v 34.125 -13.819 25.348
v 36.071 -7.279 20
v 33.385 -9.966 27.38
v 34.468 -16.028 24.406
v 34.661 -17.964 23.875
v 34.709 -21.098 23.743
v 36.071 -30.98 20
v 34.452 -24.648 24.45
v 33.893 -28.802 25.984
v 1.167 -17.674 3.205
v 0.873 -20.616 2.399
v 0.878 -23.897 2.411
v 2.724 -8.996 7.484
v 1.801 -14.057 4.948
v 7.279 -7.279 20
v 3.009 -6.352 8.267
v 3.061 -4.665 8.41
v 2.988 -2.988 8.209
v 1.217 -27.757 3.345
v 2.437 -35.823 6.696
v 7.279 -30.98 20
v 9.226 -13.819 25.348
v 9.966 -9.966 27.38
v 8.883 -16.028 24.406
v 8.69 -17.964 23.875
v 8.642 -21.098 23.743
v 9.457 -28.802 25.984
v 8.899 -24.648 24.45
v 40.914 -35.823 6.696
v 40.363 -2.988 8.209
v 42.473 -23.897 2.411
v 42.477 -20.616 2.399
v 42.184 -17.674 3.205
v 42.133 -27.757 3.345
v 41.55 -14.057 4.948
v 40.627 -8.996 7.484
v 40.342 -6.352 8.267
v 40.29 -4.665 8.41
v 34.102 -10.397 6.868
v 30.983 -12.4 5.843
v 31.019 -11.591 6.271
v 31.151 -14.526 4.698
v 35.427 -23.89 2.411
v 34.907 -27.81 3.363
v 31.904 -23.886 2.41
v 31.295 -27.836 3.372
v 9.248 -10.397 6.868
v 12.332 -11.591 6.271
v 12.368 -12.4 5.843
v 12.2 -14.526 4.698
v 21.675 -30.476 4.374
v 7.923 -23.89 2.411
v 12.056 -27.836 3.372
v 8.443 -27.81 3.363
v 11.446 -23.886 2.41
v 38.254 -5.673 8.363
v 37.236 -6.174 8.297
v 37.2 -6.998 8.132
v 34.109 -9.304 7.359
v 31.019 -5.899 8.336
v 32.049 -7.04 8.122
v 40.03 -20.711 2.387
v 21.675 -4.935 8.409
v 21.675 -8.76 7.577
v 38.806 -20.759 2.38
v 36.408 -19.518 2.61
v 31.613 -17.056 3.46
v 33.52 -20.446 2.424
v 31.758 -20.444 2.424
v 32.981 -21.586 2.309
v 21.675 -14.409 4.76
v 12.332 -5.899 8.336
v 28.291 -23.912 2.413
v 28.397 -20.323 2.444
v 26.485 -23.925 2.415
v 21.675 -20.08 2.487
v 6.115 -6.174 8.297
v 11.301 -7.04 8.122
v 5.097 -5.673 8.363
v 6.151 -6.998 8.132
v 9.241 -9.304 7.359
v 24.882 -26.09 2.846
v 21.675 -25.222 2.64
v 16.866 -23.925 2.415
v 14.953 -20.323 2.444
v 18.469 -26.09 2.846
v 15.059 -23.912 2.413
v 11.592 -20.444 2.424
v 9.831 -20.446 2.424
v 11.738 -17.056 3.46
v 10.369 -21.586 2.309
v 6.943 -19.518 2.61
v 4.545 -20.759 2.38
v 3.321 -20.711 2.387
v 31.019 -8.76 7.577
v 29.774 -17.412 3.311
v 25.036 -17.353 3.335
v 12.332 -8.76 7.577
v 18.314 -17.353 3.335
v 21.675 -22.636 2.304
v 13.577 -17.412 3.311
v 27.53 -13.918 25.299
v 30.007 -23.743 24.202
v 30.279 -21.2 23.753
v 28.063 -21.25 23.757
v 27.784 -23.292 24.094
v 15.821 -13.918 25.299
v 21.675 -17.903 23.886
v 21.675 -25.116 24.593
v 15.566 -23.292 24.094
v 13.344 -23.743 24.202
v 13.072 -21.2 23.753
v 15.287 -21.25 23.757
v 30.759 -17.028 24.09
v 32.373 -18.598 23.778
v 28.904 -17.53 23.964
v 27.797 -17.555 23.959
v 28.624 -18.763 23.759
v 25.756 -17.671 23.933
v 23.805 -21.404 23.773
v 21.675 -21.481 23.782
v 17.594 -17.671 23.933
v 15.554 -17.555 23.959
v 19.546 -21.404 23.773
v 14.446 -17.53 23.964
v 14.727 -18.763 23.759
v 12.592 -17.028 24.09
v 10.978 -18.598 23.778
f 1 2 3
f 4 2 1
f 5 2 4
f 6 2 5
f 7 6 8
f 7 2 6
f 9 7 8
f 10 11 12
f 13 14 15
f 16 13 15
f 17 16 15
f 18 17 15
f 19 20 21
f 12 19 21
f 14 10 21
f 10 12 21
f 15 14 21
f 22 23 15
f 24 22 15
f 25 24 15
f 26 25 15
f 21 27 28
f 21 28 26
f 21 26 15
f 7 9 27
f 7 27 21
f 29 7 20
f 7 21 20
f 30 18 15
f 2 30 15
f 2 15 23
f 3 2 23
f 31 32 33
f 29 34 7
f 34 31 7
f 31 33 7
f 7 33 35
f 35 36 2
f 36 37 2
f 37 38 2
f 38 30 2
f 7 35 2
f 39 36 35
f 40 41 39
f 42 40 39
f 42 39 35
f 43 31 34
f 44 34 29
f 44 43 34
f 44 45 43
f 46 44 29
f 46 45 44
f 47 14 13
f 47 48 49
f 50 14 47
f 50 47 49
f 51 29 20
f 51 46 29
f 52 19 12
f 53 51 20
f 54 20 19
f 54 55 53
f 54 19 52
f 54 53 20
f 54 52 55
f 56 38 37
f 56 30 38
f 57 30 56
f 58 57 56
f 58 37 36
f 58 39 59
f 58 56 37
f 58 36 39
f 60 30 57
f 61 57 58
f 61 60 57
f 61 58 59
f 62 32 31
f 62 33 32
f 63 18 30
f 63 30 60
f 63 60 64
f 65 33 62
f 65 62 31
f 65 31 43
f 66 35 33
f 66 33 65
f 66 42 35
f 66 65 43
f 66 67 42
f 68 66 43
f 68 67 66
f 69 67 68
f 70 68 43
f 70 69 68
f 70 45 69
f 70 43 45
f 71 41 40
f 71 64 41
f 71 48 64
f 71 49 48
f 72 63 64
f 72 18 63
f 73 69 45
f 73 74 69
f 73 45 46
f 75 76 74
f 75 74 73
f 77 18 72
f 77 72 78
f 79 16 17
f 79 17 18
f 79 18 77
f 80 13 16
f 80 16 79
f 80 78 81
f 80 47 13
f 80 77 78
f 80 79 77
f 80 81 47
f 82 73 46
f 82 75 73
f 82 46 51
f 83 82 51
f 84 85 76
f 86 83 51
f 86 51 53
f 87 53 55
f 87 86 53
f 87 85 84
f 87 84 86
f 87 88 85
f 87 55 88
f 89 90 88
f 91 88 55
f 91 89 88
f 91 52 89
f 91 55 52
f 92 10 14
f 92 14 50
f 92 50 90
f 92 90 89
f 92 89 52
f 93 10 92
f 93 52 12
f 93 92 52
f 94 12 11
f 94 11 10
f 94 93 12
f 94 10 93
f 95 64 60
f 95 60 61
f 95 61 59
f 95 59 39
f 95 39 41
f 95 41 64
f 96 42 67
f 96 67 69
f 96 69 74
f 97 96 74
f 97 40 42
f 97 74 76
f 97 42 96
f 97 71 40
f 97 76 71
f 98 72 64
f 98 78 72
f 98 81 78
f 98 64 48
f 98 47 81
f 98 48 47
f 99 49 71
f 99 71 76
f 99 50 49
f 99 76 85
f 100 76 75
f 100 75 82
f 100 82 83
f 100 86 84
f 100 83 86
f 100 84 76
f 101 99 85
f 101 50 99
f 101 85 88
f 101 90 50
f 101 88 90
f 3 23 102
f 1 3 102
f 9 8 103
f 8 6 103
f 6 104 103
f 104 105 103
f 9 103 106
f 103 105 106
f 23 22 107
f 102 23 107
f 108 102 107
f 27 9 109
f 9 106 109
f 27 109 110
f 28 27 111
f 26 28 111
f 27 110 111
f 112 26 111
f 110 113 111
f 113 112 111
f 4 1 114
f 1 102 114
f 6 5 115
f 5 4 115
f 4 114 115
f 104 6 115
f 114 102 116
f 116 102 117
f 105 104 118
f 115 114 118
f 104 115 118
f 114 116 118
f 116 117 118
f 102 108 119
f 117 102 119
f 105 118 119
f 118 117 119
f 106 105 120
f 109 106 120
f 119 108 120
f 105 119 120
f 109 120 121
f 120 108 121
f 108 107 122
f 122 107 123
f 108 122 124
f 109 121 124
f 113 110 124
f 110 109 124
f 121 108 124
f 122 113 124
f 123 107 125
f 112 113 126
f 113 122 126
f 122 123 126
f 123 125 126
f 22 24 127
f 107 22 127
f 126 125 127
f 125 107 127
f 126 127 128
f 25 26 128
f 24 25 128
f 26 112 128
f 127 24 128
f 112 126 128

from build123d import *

# Parameters (mm, degrees)
F_1_FR_W        = 43.350723316
F_1_FR_H        = 38.259713105
EXTRUDE_1_DEPTH = 20
EXTRUDE_1_TAPER = 20
OTHER_START     = -1
OTHER_1_DEPTH   = 45
OTHER_START_2   = 7.279404685
OTHER_1_2_DEPTH = 28.791913946
OTHER_START_3   = -35.822740595
OTHER_1_3_DEPTH = 32.835074171


with BuildPart() as part:
    # Эскиз1_fr → Бобышка-Вытянуть1 (new body)
    with BuildSketch(Plane.XY):
        with Locations((21.675361658, -19.129856553)):
            Rectangle(F_1_FR_W, F_1_FR_H)
    extrude(amount=EXTRUDE_1_DEPTH, taper=EXTRUDE_1_TAPER)

    # Заменить грань1: read off the stored shape, not the designer's step
    # Заменить грань1 outline → Заменить грань1 (cut)
    with BuildSketch(Plane.YZ.offset(OTHER_START)):
        with BuildLine():
            Line((0, 0), (-2.987666524, 8.208546313))
            add(Edge.make_bspline(
                [(-2.987666524, 8.208546313), (-8.870550538, 9.578826995), (-19.207758762, -1.740918138), (-30.435430933, 4.410138177), (-35.822740495, 6.695527216)],
                knots=[0.134570032, 0.134570032, 0.134570032, 0.134570032, 0.484609084, 0.79490495, 0.79490495, 0.79490495, 0.79490495], degree=3))
            Line((-35.822740495, 6.695527216), (-38.259713105, 0))
            Line((-38.259713105, 0), (0, 0))
        make_face()
    extrude(amount=OTHER_1_DEPTH, mode=Mode.SUBTRACT)

    # Other 1 2 outline → Other 1 2 (add)
    with BuildSketch(Plane.YZ.offset(OTHER_START_2)):
        with BuildLine():
            Line((-7.279404685, 20), (-9.965660529, 27.380427273))
            add(Edge.make_bspline(
                [(-9.965660529, 27.380427273), (-12.601354954, 25.979247634), (-18.69943354, 22.300628932), (-25.092854244, 24.416589038), (-28.802415021, 25.983712933)],
                knots=[0.320991938, 0.320991938, 0.320991938, 0.320991938, 0.484609084, 0.701285336, 0.701285336, 0.701285336, 0.701285336], degree=3))
            Line((-28.802415021, 25.983712933), (-30.980308419, 20))
            Line((-30.980308419, 20), (-7.279404685, 20))
        make_face()
    extrude(amount=OTHER_1_2_DEPTH)

    # Other 1 3 outline → Other 1 3 (cut)
    with BuildSketch(Plane(origin=(0, 0, 0), x_dir=(1, 0, 0), z_dir=(0, 1, 0)).offset(OTHER_START_3)):
        Polygon((9.965660529, -27.380427273), (7.279404685, -20), (7.279404685, -29), (10.555136794, -29), align=None)
        Polygon((33.385062787, -27.380427273), (32.795586522, -29), (36.071318631, -29), (36.071318631, -20), align=None)
    extrude(amount=OTHER_1_3_DEPTH, mode=Mode.SUBTRACT)


solid = part.part
